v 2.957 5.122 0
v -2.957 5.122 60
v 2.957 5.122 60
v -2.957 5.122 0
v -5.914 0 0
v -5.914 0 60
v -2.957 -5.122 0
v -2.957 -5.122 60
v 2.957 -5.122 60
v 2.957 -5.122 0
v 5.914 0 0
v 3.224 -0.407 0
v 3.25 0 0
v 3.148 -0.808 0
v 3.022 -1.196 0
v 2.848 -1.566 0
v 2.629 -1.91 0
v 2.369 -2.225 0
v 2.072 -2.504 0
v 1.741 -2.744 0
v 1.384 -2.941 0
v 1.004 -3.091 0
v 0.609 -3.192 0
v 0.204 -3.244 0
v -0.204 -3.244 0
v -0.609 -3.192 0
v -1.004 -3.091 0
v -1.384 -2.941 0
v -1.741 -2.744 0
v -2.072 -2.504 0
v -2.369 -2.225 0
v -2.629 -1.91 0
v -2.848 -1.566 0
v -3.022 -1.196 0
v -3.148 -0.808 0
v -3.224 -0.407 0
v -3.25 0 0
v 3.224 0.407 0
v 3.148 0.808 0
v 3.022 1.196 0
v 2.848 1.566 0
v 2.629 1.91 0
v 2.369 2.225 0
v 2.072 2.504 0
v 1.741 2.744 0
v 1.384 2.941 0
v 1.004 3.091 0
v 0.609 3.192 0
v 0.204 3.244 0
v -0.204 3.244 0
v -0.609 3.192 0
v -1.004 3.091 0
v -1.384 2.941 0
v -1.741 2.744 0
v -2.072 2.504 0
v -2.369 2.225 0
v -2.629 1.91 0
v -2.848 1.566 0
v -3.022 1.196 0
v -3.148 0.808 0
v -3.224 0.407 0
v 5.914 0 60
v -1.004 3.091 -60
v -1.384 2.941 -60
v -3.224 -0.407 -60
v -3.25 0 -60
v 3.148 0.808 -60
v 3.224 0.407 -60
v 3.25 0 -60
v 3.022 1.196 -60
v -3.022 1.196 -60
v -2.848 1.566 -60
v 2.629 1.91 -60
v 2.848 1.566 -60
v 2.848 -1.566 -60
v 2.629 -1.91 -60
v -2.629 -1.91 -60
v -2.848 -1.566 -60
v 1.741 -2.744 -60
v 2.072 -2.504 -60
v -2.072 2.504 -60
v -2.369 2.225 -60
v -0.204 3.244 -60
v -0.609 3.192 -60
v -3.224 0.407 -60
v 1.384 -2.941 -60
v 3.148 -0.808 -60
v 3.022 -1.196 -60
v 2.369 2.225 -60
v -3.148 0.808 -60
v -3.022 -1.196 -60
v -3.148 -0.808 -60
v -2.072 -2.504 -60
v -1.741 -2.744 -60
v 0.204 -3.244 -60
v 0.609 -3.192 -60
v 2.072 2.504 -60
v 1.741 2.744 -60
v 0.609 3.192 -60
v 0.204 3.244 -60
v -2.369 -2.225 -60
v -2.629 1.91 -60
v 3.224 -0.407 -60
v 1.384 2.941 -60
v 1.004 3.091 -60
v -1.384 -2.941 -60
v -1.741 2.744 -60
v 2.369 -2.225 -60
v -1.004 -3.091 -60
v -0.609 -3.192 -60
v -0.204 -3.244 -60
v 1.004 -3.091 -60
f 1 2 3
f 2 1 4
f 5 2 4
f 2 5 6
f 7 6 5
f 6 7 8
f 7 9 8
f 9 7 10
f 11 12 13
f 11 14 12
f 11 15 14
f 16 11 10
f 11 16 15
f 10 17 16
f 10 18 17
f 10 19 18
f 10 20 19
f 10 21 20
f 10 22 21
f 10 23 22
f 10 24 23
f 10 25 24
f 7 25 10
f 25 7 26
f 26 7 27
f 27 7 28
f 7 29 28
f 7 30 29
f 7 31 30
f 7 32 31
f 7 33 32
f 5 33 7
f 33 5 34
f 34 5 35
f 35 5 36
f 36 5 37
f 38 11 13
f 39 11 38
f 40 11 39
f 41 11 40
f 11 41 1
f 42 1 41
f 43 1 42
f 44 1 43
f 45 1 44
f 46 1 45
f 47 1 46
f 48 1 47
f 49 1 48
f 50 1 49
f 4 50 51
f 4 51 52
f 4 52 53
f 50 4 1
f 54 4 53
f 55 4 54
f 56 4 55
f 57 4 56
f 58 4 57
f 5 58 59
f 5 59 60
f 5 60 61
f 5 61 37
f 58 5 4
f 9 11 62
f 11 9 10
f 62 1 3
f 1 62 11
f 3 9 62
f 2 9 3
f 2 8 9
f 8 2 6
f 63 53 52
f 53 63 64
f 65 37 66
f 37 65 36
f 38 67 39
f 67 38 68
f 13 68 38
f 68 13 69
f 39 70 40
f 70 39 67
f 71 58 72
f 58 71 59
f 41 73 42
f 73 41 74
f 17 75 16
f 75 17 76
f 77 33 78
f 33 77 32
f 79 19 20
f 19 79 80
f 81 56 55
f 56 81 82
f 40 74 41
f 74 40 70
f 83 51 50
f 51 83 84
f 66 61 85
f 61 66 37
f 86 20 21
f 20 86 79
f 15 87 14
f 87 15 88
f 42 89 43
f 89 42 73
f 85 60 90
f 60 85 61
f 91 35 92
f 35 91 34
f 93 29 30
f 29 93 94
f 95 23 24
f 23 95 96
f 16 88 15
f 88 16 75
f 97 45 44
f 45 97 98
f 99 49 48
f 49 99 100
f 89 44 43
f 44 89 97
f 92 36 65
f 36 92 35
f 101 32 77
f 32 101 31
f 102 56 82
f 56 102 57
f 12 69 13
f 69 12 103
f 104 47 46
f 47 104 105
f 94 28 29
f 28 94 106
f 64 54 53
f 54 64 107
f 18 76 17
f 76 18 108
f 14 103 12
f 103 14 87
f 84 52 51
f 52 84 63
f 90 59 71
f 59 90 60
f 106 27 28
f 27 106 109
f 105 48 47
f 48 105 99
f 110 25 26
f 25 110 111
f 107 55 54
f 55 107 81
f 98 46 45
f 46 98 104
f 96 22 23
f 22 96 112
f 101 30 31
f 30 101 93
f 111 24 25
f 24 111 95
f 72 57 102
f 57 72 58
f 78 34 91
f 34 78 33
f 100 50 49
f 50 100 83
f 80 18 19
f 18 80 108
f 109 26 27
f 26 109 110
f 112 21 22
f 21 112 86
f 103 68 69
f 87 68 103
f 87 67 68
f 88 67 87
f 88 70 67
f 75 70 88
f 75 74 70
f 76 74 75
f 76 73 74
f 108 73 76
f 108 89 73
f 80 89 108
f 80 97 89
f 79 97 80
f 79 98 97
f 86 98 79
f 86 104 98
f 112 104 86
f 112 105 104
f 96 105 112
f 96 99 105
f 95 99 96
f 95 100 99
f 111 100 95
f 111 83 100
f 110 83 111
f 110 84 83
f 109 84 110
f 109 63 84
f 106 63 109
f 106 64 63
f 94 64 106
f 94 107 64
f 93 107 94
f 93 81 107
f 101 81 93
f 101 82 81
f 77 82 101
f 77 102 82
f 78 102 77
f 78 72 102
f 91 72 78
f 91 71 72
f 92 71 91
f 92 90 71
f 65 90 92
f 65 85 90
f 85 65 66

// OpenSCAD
$fn = 50;


difference() {
	union() {
		linear_extrude(height = 60) {
			polygon(points = [[5.9142500000, 0.0000000000], [2.9571250000, 5.1218907443], [-2.9571250000, 5.1218907443], [-5.9142500000, 0.0000000000], [-2.9571250000, -5.1218907443], [2.9571250000, -5.1218907443]]);
		}
		translate(v = [0, 0, -60]) {
			cylinder(h = 60, r = 3.2500000000);
		}
	}
	union();
}
